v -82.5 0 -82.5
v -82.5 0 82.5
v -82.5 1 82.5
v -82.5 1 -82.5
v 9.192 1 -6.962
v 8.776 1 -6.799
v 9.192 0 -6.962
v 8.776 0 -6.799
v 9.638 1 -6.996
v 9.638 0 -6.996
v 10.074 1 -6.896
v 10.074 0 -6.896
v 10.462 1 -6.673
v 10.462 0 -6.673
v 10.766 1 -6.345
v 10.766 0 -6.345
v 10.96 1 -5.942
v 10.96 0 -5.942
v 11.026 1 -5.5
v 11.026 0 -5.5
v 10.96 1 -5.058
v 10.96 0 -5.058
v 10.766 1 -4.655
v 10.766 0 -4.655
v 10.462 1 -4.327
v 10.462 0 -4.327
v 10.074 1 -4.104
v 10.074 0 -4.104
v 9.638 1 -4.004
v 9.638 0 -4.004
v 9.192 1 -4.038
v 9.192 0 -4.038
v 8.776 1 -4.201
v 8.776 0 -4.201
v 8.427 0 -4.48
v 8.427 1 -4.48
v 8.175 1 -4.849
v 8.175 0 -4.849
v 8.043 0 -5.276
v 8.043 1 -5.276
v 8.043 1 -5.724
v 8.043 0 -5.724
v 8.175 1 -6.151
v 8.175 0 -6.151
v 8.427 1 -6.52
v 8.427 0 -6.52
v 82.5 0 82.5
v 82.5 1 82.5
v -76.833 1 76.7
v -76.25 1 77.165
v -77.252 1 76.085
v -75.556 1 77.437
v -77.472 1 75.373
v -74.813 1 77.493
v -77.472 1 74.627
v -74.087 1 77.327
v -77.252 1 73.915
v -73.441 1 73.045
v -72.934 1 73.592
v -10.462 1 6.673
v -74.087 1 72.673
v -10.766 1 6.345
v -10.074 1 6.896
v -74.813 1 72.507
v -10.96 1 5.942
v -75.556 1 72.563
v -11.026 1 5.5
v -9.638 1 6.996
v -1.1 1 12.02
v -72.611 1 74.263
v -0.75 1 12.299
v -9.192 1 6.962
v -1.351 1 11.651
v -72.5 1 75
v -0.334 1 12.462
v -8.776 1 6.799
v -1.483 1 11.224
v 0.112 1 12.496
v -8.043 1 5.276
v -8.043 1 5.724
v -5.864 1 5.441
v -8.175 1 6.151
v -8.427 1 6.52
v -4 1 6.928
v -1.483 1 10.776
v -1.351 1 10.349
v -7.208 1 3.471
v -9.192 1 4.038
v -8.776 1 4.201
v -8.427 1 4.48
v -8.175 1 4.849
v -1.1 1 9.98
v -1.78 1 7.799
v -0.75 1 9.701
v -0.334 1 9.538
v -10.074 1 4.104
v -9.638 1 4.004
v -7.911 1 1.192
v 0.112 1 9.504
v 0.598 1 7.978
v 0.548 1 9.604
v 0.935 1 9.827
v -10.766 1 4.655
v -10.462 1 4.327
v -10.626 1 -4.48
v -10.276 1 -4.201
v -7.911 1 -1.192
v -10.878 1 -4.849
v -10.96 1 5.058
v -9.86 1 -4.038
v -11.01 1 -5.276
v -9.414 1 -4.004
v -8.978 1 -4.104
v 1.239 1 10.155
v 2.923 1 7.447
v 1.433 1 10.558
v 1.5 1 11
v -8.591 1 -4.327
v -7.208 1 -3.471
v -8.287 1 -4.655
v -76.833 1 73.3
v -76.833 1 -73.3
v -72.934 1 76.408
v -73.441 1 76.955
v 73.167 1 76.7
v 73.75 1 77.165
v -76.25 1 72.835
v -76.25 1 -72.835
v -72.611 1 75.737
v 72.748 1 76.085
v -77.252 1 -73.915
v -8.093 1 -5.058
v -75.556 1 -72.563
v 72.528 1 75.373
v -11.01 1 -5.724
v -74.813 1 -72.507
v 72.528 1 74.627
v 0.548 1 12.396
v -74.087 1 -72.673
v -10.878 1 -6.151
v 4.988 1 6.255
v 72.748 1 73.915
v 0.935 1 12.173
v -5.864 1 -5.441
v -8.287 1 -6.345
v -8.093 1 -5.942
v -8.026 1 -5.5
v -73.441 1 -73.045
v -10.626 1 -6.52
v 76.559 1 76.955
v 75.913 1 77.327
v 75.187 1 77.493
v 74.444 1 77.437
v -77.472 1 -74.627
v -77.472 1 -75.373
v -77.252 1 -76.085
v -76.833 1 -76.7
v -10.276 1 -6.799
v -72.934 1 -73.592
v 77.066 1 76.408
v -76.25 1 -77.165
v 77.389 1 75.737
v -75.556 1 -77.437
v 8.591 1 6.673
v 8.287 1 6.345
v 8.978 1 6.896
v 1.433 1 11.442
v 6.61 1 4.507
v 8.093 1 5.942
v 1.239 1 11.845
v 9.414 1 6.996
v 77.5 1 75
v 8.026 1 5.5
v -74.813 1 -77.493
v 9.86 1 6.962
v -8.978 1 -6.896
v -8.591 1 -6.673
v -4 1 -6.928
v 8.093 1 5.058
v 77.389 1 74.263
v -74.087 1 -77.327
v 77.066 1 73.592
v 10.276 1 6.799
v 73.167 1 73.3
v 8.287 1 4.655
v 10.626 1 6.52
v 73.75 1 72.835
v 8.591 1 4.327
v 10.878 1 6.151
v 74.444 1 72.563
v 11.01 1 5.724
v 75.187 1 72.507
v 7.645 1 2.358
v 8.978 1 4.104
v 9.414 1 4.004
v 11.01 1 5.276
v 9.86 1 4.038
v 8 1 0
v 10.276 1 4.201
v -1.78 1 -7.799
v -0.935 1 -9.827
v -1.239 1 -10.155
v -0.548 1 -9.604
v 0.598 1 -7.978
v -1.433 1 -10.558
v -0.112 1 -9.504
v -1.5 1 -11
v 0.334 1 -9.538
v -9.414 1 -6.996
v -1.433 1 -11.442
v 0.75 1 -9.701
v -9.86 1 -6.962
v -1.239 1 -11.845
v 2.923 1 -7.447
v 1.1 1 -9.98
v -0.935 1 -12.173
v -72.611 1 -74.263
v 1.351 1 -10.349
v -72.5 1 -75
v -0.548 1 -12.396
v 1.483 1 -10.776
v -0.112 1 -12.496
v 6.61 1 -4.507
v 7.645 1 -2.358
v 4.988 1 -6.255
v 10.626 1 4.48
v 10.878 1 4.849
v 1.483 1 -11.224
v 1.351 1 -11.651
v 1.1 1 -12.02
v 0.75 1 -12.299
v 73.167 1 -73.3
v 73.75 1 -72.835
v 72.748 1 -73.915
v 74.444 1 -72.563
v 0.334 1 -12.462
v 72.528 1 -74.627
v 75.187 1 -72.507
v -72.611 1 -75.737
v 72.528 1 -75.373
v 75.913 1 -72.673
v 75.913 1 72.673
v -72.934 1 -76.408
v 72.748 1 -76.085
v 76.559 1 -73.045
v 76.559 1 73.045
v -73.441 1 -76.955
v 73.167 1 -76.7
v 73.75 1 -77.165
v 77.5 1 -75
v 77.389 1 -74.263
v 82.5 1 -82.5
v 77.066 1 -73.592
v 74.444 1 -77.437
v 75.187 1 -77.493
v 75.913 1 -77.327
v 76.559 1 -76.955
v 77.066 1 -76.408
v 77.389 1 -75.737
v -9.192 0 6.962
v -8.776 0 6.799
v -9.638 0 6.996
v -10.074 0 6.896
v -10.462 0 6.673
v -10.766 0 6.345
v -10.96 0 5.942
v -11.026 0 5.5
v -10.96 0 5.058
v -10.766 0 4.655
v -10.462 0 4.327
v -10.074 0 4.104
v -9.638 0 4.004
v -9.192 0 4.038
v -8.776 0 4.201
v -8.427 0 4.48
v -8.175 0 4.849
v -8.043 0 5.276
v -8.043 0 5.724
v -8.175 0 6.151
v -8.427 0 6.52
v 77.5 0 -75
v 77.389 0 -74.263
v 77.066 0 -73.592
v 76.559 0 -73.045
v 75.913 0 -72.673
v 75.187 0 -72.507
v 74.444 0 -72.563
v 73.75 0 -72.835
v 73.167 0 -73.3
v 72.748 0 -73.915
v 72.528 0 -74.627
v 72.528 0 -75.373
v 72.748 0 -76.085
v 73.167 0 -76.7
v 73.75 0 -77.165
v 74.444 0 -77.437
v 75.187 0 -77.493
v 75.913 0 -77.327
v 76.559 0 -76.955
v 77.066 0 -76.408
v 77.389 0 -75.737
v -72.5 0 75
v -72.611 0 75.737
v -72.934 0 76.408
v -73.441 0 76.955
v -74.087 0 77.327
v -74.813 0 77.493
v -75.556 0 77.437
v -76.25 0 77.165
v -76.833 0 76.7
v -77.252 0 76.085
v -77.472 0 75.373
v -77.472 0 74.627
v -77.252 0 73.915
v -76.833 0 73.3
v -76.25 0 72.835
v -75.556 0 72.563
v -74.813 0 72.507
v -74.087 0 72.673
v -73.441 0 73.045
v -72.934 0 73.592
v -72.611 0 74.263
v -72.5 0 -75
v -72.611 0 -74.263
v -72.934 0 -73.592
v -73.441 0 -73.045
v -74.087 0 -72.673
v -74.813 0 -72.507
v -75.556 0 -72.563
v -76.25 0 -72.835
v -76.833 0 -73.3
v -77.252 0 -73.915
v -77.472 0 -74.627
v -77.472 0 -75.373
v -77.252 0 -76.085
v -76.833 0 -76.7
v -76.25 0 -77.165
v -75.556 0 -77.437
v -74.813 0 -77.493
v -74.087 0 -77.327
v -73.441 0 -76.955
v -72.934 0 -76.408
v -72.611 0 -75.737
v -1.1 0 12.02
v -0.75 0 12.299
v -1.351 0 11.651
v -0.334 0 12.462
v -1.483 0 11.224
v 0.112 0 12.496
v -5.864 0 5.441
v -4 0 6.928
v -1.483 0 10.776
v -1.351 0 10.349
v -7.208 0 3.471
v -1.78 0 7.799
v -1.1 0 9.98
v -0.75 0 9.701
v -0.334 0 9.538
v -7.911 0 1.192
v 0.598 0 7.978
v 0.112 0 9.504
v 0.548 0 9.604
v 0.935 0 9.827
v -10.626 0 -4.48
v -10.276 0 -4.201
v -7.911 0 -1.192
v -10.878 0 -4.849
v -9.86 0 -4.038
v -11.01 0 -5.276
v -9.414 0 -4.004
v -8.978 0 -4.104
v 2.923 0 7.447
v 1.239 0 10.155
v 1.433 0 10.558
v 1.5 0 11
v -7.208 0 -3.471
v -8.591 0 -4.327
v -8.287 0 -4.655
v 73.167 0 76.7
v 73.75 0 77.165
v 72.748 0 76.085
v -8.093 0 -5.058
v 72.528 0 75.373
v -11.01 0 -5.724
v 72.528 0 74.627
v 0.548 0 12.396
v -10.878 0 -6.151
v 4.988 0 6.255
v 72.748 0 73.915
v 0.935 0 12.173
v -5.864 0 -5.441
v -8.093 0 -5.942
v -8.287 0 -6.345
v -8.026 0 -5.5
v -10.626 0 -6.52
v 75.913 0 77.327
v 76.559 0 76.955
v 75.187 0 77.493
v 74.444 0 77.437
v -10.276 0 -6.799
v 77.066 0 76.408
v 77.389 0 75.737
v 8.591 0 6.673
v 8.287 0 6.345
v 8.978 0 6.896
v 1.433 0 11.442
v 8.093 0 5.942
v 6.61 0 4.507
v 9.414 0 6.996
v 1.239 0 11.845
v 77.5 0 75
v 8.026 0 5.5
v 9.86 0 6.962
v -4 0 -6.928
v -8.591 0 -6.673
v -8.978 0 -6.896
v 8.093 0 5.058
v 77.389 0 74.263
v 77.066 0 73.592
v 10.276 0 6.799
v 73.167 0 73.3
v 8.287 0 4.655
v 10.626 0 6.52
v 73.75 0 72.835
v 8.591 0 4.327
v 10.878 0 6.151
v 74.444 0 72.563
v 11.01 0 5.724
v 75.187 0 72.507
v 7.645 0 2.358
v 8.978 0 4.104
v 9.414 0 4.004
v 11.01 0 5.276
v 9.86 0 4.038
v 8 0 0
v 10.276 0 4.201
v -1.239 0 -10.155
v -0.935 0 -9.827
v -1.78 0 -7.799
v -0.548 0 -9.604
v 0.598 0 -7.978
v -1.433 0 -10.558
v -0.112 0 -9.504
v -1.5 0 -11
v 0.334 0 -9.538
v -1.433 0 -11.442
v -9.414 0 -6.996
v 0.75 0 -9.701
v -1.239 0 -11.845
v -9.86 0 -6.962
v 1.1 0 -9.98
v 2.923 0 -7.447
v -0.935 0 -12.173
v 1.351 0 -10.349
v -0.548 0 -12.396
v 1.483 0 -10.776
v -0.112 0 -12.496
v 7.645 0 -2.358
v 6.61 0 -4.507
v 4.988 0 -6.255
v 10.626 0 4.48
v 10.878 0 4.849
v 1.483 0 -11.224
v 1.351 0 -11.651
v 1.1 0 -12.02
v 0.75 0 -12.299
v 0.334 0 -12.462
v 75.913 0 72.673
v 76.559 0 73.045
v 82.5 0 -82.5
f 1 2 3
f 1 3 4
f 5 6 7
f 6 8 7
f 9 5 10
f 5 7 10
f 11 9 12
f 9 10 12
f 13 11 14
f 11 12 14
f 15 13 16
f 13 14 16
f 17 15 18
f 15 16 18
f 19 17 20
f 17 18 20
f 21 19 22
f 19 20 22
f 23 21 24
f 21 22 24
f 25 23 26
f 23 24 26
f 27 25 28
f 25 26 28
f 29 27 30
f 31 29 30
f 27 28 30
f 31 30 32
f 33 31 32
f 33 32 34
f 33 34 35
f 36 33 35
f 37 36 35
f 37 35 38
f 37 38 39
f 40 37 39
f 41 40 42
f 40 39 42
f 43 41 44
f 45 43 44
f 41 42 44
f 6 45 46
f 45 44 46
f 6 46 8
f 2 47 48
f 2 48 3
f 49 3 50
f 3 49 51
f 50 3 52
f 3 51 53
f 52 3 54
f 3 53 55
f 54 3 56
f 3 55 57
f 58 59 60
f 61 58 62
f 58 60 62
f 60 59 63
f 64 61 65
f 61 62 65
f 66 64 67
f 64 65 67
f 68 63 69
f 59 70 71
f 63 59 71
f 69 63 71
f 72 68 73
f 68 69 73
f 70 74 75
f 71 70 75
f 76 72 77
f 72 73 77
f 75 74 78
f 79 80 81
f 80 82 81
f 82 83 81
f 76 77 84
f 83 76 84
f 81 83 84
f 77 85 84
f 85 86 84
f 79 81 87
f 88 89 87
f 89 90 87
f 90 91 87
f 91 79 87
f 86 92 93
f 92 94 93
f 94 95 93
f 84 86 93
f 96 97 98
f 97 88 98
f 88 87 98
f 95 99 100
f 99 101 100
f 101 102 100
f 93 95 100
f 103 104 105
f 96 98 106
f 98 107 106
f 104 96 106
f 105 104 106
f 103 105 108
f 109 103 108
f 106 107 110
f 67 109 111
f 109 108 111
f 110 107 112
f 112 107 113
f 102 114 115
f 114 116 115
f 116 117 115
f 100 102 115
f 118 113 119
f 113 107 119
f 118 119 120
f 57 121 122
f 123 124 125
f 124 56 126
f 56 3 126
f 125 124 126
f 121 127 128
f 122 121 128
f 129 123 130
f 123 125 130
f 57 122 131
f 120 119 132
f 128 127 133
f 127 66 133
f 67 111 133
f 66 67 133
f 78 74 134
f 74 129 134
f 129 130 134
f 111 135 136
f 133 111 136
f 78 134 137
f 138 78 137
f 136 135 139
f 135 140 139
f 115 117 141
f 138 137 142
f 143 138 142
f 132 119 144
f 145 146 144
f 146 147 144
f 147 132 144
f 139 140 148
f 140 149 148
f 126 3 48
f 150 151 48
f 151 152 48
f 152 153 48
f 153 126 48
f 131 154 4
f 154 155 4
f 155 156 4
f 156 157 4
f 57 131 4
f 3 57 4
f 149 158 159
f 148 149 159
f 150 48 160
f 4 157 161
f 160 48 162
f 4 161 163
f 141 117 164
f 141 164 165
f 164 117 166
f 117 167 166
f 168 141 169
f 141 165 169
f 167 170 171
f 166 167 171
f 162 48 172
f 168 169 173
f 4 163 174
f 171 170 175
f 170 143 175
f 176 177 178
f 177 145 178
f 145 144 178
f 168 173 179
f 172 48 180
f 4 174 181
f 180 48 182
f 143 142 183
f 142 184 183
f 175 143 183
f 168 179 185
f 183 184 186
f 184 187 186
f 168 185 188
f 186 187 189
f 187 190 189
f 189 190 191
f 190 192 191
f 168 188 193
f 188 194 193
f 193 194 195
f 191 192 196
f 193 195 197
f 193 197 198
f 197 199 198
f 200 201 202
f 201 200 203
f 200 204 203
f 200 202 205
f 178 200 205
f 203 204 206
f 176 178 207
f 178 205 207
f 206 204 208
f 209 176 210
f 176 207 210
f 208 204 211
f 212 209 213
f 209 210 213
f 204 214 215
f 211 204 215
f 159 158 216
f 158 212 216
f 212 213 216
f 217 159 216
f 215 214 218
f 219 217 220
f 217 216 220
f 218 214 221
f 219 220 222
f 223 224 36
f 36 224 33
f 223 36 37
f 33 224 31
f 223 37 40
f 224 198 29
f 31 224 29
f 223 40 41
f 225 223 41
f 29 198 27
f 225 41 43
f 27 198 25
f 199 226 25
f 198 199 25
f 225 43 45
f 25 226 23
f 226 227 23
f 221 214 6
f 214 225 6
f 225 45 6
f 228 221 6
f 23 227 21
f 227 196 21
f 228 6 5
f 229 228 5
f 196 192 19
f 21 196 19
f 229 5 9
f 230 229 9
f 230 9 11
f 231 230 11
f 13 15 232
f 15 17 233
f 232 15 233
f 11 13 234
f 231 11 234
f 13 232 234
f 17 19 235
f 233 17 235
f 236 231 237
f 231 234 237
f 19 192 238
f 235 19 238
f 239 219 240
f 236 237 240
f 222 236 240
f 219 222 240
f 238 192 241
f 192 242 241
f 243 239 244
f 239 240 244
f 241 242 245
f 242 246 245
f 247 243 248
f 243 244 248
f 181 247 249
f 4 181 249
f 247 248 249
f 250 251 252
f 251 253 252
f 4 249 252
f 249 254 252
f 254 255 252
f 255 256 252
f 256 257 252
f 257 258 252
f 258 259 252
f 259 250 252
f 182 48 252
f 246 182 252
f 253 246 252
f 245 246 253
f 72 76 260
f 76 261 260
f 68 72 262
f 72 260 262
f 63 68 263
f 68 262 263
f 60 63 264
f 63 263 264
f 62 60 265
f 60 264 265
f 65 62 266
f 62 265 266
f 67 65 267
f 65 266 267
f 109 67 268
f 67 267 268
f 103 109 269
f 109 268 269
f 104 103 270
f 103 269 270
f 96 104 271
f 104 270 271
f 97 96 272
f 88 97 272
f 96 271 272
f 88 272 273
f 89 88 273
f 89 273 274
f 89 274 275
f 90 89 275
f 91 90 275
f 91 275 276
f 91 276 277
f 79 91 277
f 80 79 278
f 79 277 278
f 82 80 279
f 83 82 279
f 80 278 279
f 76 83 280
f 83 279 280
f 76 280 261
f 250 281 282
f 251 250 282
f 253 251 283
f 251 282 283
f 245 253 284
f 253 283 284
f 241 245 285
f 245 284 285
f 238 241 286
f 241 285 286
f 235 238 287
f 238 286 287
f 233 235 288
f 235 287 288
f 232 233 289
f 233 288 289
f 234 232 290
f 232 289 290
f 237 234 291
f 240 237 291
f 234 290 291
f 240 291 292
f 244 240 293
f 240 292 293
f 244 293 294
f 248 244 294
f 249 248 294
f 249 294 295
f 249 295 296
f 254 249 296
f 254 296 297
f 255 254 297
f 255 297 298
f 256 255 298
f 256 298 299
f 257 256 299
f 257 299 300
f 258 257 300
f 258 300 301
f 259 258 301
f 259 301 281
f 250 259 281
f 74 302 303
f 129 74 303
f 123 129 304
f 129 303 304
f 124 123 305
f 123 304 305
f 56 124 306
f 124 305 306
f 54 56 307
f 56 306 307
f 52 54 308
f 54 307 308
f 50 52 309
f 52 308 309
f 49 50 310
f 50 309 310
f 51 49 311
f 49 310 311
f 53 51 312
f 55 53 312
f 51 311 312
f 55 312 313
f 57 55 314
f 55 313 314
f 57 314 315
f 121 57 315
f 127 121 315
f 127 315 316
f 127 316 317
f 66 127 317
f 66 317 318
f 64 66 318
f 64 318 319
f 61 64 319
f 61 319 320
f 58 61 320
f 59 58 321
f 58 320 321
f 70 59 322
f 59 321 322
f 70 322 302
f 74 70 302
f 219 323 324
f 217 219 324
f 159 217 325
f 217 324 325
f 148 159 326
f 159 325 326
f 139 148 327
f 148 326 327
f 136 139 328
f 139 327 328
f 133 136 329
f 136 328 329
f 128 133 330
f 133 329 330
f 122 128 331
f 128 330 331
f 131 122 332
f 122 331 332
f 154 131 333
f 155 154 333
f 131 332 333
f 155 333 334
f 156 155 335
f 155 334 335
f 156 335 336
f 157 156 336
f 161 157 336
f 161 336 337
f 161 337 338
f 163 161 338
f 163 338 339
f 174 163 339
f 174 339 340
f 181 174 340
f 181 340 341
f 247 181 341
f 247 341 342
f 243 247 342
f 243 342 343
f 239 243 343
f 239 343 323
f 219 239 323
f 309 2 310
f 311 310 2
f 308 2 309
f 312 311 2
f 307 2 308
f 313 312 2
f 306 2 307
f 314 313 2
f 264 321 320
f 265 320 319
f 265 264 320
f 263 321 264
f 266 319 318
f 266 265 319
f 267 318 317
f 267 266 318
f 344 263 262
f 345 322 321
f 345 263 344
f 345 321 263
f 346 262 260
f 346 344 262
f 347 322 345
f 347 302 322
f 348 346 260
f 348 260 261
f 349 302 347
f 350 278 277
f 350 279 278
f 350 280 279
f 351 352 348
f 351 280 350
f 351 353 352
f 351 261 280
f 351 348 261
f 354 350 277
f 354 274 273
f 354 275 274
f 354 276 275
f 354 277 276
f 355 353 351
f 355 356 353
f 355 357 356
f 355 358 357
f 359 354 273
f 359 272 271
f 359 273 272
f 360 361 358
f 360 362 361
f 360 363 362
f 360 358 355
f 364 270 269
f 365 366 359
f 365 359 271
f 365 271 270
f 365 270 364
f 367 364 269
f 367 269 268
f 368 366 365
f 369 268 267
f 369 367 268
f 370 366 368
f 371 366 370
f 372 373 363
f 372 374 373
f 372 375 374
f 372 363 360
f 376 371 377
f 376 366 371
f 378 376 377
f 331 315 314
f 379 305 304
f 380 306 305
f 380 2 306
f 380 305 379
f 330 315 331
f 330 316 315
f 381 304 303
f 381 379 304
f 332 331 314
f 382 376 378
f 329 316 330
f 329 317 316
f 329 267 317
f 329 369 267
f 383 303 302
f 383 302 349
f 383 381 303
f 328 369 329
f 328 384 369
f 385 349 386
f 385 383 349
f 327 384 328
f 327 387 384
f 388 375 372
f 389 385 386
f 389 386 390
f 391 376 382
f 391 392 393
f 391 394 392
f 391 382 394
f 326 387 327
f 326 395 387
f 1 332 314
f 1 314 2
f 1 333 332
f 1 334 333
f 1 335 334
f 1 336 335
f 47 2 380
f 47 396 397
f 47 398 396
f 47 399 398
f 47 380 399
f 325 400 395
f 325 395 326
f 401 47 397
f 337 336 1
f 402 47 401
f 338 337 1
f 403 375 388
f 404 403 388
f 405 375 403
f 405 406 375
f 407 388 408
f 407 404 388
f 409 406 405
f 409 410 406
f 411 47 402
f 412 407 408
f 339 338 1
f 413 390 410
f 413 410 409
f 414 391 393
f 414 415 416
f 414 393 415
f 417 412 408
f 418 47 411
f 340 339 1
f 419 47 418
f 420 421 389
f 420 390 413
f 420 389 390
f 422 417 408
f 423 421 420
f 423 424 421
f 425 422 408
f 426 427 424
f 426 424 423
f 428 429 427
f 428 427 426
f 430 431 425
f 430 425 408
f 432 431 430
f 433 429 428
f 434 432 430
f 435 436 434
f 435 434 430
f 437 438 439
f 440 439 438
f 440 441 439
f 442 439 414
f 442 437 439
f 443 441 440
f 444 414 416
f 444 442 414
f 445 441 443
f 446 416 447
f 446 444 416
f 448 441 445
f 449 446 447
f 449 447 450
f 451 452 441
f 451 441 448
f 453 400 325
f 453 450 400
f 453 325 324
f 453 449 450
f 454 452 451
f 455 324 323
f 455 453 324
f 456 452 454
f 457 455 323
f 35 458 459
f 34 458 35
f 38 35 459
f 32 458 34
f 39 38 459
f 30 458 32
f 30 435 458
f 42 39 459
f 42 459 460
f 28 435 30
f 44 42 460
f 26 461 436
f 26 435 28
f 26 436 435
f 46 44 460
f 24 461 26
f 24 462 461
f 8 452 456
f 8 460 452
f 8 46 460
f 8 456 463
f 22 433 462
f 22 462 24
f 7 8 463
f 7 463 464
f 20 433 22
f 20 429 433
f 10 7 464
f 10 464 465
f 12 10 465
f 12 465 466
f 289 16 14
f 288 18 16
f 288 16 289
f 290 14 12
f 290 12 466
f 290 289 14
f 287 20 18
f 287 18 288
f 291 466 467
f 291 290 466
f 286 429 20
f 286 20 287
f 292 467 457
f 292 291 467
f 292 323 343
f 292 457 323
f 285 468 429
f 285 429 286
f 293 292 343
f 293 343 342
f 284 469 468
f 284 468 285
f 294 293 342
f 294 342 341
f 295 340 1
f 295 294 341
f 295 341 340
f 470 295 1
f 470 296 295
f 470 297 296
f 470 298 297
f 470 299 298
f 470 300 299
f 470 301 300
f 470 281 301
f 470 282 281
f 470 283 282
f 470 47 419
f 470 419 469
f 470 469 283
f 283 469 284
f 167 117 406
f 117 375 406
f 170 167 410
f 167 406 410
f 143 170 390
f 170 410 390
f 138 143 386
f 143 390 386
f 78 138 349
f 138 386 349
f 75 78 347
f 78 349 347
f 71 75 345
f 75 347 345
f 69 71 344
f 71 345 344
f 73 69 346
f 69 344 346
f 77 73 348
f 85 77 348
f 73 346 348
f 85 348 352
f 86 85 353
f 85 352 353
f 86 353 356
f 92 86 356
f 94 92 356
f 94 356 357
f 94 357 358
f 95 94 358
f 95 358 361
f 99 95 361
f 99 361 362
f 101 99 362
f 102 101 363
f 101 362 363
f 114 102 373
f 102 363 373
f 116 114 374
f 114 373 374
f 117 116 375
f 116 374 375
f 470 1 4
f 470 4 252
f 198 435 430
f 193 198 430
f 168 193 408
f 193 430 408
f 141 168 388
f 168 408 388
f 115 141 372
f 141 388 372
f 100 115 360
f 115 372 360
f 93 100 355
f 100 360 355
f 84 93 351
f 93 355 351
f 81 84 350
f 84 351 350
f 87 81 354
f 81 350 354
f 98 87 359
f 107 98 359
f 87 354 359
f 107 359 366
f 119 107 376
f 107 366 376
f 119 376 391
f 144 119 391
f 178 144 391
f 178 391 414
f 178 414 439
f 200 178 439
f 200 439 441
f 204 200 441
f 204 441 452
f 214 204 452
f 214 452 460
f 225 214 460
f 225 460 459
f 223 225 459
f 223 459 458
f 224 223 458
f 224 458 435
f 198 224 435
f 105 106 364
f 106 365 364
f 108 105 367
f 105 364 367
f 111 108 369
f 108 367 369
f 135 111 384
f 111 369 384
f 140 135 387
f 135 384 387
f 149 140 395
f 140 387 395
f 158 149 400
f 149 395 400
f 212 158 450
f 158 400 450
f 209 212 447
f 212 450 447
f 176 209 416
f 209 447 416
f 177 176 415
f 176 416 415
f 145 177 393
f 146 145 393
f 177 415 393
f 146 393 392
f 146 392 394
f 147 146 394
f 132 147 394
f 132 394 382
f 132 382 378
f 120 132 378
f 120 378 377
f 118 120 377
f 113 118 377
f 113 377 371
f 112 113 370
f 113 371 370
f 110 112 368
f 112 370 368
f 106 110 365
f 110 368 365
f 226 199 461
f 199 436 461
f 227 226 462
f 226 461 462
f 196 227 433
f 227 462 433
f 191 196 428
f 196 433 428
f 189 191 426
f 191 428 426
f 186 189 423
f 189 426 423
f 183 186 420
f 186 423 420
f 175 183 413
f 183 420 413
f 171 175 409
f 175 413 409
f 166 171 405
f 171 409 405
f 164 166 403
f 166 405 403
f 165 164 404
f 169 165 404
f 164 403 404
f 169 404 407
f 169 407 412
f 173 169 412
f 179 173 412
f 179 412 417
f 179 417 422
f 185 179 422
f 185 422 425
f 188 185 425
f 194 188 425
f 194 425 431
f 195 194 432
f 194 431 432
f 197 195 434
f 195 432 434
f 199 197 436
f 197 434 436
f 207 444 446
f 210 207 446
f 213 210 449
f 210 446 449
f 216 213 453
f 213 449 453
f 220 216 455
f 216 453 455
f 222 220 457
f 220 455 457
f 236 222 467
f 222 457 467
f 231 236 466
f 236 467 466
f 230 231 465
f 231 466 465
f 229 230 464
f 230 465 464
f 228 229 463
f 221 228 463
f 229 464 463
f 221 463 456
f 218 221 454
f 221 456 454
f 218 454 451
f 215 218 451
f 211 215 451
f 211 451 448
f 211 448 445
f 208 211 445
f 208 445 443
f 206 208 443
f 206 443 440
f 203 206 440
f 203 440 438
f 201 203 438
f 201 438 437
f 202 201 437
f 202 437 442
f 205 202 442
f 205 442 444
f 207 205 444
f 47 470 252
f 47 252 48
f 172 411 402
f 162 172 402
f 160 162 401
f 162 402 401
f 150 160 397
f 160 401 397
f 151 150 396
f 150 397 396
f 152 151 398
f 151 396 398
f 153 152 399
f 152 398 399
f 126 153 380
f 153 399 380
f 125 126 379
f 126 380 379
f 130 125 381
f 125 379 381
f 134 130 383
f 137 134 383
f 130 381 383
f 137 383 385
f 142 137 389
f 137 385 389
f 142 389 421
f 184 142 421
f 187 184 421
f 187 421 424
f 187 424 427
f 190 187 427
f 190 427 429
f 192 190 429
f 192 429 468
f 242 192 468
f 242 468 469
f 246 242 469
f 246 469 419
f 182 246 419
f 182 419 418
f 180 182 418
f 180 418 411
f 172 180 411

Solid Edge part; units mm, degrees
sketch "Sketch1" plane through (0, 0, 0) normal (0, -1, 0) x (1, 0, 0)
  line L0 (-82.5, -82.5) -> (82.5, -82.5)
  line L1 (82.5, -82.5) -> (82.5, 82.5)
  line L2 (82.5, 82.5) -> (-82.5, 82.5)
  line L3 (-82.5, 82.5) -> (-82.5, -82.5)
  circle A0 centre (0, 0) radius 2
  dimension "D1" = 165
extrude "Protrusion1" add sketch "Sketch1" against normal blind 1
sketch "Sketch2" plane through (0, 0, 0) normal (0, -1, 0) x (1, 0, 0)
  circle A0 centre (0, 0) radius 8
extrude "Cutout1" cut sketch "Sketch2" against normal through all
sketch "Sketch3" plane through (0, 0, 0) normal (0, -1, 0) x (1, 0, 0)
  circle A0 centre (-75, 75) radius 2.5
  circle A1 centre (75, 75) radius 2.5
  circle A2 centre (75, -75) radius 2.5
  circle A3 centre (-75, -75) radius 2.5
  dimension "D1" = 165
extrude "Cutout2" cut sketch "Sketch3" against normal through all
sketch "Sketch4" plane through (0, 0, 0) normal (0, -1, 0) x (1, 0, 0)
  circle A0 centre (0, 11) radius 1.5
extrude "Cutout3" cut sketch "Sketch4" against normal through all
pattern_circular "Pattern1" count 6 over 360 about axis through (0, 0, 0) along (0, 1, 0) of "Cutout3"
properties material "Aluminum, 1060"
